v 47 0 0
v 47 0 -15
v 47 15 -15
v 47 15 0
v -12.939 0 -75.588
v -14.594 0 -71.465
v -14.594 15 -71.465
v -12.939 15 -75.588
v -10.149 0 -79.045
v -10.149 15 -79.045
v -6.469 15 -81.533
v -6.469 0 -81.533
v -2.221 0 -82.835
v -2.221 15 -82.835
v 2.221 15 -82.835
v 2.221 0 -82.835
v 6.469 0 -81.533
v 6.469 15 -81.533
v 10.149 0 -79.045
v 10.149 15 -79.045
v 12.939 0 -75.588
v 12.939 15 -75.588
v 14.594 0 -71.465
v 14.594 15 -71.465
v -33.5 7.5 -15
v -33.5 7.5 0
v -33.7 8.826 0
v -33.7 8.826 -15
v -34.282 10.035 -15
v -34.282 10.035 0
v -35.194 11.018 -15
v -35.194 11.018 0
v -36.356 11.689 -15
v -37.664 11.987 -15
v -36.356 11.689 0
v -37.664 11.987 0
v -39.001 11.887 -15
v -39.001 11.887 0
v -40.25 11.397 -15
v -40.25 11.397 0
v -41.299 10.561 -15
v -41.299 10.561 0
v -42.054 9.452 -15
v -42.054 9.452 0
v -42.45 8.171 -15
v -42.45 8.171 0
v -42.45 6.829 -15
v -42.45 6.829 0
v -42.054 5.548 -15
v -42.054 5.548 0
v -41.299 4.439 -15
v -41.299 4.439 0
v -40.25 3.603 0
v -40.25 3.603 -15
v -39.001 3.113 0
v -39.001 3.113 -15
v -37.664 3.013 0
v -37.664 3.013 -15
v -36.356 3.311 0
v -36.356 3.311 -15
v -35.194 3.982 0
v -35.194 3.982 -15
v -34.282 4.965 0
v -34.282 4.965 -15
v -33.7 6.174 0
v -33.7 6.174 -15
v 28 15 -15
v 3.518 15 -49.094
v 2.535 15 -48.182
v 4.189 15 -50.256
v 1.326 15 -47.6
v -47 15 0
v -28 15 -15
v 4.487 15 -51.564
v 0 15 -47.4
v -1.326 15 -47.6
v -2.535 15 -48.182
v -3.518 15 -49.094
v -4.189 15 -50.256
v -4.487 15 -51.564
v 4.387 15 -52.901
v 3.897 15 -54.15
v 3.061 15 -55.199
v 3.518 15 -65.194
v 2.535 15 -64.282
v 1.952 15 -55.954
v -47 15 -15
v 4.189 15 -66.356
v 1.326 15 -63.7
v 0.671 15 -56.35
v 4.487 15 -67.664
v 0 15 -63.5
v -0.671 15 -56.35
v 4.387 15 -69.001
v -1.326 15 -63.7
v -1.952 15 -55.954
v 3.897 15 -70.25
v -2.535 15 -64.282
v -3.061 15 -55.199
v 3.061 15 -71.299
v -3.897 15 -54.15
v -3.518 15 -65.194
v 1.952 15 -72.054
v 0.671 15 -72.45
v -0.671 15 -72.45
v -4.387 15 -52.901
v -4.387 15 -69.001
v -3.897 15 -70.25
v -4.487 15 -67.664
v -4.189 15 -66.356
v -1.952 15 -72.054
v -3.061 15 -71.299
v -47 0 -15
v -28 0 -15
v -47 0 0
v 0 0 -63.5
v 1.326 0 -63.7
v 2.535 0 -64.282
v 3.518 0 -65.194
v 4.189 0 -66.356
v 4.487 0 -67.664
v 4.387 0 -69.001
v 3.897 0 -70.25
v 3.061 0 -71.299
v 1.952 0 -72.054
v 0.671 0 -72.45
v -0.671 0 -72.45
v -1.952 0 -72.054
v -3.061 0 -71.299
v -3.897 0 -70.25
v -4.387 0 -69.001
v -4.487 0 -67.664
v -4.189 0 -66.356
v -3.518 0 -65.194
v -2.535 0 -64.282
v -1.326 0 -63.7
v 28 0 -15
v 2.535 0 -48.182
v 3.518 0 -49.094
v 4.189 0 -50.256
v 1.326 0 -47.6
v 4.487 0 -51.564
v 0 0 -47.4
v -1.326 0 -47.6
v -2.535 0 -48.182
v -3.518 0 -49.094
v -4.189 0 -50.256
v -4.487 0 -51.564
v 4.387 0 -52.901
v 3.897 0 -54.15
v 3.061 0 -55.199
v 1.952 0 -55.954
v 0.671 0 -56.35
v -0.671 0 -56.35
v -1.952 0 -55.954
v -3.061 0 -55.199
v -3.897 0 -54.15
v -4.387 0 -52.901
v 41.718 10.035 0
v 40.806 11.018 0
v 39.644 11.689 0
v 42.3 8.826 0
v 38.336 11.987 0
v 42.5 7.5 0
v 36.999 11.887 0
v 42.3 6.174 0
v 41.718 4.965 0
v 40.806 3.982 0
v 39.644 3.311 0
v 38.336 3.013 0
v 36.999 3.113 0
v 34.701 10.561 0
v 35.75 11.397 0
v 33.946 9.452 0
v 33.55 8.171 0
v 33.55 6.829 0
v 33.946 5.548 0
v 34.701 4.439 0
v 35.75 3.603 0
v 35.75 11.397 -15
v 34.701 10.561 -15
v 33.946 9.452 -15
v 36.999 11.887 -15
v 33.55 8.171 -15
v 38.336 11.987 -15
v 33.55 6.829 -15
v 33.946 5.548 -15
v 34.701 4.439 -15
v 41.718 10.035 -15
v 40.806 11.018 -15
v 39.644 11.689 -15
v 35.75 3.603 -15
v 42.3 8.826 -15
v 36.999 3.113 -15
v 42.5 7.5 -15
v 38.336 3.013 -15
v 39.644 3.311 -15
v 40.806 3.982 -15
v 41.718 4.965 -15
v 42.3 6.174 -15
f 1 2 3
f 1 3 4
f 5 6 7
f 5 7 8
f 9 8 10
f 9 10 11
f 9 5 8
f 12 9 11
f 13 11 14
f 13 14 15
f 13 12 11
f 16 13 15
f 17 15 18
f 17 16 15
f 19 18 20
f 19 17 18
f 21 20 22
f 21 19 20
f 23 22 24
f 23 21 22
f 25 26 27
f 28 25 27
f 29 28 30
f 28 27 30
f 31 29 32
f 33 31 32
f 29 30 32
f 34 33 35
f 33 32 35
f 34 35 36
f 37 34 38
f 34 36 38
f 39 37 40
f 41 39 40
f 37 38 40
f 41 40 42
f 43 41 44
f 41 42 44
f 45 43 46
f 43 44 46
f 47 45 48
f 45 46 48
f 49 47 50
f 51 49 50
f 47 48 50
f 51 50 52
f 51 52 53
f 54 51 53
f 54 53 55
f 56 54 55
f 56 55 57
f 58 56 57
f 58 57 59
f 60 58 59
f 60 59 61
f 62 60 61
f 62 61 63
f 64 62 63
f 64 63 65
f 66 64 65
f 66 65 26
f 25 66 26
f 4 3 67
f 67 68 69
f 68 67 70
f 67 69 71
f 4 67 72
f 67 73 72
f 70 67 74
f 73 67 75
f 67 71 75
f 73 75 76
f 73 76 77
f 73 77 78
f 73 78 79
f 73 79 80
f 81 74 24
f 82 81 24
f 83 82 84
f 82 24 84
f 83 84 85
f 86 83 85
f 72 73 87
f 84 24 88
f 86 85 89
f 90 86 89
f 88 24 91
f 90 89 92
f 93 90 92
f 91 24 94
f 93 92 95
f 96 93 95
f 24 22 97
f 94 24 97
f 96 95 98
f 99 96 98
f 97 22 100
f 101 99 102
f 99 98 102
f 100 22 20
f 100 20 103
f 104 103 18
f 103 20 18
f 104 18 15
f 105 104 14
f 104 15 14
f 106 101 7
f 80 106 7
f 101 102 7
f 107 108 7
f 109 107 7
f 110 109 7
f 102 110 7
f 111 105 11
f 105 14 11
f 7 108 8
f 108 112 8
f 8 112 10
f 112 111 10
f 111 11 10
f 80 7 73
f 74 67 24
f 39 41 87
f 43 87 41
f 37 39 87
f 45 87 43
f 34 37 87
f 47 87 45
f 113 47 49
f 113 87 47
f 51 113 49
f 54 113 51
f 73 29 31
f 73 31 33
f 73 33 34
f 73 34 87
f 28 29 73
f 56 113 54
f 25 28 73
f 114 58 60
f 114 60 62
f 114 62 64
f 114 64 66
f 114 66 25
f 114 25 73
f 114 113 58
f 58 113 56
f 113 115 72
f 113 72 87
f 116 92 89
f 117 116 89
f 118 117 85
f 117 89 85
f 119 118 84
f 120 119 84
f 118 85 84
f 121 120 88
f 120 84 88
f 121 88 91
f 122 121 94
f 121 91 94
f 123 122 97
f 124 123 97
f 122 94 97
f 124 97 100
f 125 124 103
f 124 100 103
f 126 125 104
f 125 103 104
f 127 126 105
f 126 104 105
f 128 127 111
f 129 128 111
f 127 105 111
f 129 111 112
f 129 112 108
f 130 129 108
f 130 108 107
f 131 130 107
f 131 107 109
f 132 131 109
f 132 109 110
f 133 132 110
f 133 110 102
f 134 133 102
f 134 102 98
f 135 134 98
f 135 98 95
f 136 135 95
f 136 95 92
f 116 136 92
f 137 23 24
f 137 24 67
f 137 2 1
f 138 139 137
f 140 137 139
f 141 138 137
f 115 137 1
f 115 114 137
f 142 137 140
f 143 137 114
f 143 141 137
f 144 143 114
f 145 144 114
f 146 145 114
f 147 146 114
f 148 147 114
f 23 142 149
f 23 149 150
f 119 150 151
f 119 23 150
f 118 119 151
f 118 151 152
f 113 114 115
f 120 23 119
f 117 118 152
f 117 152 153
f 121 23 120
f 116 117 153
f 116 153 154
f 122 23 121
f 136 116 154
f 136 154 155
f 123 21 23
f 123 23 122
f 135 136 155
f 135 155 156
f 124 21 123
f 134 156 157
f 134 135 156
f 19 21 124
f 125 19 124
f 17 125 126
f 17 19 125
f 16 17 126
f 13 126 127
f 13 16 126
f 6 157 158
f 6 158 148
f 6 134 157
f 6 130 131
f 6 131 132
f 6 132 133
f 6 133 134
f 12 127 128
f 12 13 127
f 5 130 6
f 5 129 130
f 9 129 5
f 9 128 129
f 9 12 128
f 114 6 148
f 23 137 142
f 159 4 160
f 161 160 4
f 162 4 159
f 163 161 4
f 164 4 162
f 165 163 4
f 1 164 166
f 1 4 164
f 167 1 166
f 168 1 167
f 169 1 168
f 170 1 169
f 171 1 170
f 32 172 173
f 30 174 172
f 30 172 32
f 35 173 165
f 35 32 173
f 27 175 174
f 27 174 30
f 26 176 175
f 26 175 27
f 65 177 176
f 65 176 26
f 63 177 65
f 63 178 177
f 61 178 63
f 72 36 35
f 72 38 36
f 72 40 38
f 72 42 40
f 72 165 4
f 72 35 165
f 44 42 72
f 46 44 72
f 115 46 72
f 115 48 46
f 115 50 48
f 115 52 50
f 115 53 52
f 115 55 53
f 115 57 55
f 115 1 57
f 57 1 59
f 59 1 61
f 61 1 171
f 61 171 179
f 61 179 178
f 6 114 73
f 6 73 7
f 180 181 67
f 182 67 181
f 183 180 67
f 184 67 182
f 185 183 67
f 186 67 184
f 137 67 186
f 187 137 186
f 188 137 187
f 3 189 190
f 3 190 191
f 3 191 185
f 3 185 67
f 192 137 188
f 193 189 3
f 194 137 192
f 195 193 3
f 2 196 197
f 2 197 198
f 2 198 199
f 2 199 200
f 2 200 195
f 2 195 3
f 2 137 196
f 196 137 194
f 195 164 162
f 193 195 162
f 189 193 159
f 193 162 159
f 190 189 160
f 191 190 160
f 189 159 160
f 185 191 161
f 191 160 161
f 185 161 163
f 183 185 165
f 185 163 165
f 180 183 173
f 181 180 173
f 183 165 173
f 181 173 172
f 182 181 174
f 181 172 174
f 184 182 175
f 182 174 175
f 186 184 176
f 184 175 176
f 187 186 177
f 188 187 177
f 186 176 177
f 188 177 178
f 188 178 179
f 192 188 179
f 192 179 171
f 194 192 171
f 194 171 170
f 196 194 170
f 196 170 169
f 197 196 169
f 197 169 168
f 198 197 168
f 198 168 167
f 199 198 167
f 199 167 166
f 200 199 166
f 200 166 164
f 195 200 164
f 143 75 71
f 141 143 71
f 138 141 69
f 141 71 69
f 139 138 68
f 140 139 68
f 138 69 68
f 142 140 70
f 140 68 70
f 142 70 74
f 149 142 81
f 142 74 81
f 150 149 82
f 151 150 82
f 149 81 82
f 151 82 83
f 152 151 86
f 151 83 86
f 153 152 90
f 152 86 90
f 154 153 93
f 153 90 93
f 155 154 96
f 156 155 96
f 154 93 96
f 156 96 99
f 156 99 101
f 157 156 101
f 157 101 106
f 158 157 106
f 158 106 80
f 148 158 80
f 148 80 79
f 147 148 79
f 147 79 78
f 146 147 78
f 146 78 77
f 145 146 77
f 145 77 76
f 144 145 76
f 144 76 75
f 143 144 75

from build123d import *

# Parameters (mm, degrees)
SALIENTE_EXTRUIR1_DEPTH = 15
CORTAR_EXTRUIR1_REACH   = 98.556
CROQUIS2_R              = 4.5
CORTAR_EXTRUIR2_REACH   = 98.556
CROQUIS3_R              = 4.5


with BuildPart() as part:
    # Croquis1 → Saliente-Extruir1 (new body)
    with BuildSketch(Plane(origin=(0, 0, 0), x_dir=(1, 0, 0), z_dir=(0, 1, 0))):
        with BuildLine():
            Line((47, 0), (-47, 0))
            Line((-47, 0), (-47, 15))
            Line((-47, 15), (-28, 15))
            Line((-28, 15), (-14.594323866, 71.464925816))
            ThreePointArc((-14.594323866, 71.464925816), (0, 83), (14.594323866, 71.464925816))
            Line((14.594323866, 71.464925816), (28, 15))
            Line((28, 15), (47, 15))
            Line((47, 15), (47, 0))
        make_face()
    extrude(amount=SALIENTE_EXTRUIR1_DEPTH)

    # Croquis2 → Cortar-Extruir1 (cut, up to next)
    with BuildSketch(Plane.XY, mode=Mode.PRIVATE) as cortar_extruir1_sk1:
        with Locations((-38, 7.5)):
            Circle(CROQUIS2_R)
    cortar_extruir1_tool1 = extrude(cortar_extruir1_sk1.sketch, amount=-CORTAR_EXTRUIR1_REACH, mode=Mode.PRIVATE) & part.part
    # Croquis2 → Cortar-Extruir1 (cut, up to next)
    with BuildSketch(Plane.XY, mode=Mode.PRIVATE) as cortar_extruir1_sk2:
        with Locations((38, 7.5)):
            Circle(CROQUIS2_R)
    cortar_extruir1_tool2 = extrude(cortar_extruir1_sk2.sketch, amount=-CORTAR_EXTRUIR1_REACH, mode=Mode.PRIVATE) & part.part
    add(cortar_extruir1_tool1.solids().sort_by_distance((-38, 7.5, 0))[0], mode=Mode.SUBTRACT)
    add(cortar_extruir1_tool2.solids().sort_by_distance((38, 7.5, 0))[0], mode=Mode.SUBTRACT)

    # Croquis3 → Cortar-Extruir2 (cut, up to next)
    with BuildSketch(Plane(origin=(0, 15, 0), x_dir=(1, 0, 0), z_dir=(0, 1, 0)), mode=Mode.PRIVATE) as cortar_extruir2_sk1:
        with Locations(Location((0, 68, 0), (0, 0, 270))):
            Circle(CROQUIS3_R)
    cortar_extruir2_tool1 = extrude(cortar_extruir2_sk1.sketch, amount=-CORTAR_EXTRUIR2_REACH, mode=Mode.PRIVATE) & part.part
    # Croquis3 → Cortar-Extruir2 (cut, up to next)
    with BuildSketch(Plane(origin=(0, 15, 0), x_dir=(1, 0, 0), z_dir=(0, 1, 0)), mode=Mode.PRIVATE) as cortar_extruir2_sk2:
        with Locations(Location((0, 51.9, 0), (0, 0, 270))):
            Circle(CROQUIS3_R)
    cortar_extruir2_tool2 = extrude(cortar_extruir2_sk2.sketch, amount=-CORTAR_EXTRUIR2_REACH, mode=Mode.PRIVATE) & part.part
    add(cortar_extruir2_tool1.solids().sort_by_distance((0, 15, -68))[0], mode=Mode.SUBTRACT)
    add(cortar_extruir2_tool2.solids().sort_by_distance((0, 15, -51.9))[0], mode=Mode.SUBTRACT)


solid = part.part
